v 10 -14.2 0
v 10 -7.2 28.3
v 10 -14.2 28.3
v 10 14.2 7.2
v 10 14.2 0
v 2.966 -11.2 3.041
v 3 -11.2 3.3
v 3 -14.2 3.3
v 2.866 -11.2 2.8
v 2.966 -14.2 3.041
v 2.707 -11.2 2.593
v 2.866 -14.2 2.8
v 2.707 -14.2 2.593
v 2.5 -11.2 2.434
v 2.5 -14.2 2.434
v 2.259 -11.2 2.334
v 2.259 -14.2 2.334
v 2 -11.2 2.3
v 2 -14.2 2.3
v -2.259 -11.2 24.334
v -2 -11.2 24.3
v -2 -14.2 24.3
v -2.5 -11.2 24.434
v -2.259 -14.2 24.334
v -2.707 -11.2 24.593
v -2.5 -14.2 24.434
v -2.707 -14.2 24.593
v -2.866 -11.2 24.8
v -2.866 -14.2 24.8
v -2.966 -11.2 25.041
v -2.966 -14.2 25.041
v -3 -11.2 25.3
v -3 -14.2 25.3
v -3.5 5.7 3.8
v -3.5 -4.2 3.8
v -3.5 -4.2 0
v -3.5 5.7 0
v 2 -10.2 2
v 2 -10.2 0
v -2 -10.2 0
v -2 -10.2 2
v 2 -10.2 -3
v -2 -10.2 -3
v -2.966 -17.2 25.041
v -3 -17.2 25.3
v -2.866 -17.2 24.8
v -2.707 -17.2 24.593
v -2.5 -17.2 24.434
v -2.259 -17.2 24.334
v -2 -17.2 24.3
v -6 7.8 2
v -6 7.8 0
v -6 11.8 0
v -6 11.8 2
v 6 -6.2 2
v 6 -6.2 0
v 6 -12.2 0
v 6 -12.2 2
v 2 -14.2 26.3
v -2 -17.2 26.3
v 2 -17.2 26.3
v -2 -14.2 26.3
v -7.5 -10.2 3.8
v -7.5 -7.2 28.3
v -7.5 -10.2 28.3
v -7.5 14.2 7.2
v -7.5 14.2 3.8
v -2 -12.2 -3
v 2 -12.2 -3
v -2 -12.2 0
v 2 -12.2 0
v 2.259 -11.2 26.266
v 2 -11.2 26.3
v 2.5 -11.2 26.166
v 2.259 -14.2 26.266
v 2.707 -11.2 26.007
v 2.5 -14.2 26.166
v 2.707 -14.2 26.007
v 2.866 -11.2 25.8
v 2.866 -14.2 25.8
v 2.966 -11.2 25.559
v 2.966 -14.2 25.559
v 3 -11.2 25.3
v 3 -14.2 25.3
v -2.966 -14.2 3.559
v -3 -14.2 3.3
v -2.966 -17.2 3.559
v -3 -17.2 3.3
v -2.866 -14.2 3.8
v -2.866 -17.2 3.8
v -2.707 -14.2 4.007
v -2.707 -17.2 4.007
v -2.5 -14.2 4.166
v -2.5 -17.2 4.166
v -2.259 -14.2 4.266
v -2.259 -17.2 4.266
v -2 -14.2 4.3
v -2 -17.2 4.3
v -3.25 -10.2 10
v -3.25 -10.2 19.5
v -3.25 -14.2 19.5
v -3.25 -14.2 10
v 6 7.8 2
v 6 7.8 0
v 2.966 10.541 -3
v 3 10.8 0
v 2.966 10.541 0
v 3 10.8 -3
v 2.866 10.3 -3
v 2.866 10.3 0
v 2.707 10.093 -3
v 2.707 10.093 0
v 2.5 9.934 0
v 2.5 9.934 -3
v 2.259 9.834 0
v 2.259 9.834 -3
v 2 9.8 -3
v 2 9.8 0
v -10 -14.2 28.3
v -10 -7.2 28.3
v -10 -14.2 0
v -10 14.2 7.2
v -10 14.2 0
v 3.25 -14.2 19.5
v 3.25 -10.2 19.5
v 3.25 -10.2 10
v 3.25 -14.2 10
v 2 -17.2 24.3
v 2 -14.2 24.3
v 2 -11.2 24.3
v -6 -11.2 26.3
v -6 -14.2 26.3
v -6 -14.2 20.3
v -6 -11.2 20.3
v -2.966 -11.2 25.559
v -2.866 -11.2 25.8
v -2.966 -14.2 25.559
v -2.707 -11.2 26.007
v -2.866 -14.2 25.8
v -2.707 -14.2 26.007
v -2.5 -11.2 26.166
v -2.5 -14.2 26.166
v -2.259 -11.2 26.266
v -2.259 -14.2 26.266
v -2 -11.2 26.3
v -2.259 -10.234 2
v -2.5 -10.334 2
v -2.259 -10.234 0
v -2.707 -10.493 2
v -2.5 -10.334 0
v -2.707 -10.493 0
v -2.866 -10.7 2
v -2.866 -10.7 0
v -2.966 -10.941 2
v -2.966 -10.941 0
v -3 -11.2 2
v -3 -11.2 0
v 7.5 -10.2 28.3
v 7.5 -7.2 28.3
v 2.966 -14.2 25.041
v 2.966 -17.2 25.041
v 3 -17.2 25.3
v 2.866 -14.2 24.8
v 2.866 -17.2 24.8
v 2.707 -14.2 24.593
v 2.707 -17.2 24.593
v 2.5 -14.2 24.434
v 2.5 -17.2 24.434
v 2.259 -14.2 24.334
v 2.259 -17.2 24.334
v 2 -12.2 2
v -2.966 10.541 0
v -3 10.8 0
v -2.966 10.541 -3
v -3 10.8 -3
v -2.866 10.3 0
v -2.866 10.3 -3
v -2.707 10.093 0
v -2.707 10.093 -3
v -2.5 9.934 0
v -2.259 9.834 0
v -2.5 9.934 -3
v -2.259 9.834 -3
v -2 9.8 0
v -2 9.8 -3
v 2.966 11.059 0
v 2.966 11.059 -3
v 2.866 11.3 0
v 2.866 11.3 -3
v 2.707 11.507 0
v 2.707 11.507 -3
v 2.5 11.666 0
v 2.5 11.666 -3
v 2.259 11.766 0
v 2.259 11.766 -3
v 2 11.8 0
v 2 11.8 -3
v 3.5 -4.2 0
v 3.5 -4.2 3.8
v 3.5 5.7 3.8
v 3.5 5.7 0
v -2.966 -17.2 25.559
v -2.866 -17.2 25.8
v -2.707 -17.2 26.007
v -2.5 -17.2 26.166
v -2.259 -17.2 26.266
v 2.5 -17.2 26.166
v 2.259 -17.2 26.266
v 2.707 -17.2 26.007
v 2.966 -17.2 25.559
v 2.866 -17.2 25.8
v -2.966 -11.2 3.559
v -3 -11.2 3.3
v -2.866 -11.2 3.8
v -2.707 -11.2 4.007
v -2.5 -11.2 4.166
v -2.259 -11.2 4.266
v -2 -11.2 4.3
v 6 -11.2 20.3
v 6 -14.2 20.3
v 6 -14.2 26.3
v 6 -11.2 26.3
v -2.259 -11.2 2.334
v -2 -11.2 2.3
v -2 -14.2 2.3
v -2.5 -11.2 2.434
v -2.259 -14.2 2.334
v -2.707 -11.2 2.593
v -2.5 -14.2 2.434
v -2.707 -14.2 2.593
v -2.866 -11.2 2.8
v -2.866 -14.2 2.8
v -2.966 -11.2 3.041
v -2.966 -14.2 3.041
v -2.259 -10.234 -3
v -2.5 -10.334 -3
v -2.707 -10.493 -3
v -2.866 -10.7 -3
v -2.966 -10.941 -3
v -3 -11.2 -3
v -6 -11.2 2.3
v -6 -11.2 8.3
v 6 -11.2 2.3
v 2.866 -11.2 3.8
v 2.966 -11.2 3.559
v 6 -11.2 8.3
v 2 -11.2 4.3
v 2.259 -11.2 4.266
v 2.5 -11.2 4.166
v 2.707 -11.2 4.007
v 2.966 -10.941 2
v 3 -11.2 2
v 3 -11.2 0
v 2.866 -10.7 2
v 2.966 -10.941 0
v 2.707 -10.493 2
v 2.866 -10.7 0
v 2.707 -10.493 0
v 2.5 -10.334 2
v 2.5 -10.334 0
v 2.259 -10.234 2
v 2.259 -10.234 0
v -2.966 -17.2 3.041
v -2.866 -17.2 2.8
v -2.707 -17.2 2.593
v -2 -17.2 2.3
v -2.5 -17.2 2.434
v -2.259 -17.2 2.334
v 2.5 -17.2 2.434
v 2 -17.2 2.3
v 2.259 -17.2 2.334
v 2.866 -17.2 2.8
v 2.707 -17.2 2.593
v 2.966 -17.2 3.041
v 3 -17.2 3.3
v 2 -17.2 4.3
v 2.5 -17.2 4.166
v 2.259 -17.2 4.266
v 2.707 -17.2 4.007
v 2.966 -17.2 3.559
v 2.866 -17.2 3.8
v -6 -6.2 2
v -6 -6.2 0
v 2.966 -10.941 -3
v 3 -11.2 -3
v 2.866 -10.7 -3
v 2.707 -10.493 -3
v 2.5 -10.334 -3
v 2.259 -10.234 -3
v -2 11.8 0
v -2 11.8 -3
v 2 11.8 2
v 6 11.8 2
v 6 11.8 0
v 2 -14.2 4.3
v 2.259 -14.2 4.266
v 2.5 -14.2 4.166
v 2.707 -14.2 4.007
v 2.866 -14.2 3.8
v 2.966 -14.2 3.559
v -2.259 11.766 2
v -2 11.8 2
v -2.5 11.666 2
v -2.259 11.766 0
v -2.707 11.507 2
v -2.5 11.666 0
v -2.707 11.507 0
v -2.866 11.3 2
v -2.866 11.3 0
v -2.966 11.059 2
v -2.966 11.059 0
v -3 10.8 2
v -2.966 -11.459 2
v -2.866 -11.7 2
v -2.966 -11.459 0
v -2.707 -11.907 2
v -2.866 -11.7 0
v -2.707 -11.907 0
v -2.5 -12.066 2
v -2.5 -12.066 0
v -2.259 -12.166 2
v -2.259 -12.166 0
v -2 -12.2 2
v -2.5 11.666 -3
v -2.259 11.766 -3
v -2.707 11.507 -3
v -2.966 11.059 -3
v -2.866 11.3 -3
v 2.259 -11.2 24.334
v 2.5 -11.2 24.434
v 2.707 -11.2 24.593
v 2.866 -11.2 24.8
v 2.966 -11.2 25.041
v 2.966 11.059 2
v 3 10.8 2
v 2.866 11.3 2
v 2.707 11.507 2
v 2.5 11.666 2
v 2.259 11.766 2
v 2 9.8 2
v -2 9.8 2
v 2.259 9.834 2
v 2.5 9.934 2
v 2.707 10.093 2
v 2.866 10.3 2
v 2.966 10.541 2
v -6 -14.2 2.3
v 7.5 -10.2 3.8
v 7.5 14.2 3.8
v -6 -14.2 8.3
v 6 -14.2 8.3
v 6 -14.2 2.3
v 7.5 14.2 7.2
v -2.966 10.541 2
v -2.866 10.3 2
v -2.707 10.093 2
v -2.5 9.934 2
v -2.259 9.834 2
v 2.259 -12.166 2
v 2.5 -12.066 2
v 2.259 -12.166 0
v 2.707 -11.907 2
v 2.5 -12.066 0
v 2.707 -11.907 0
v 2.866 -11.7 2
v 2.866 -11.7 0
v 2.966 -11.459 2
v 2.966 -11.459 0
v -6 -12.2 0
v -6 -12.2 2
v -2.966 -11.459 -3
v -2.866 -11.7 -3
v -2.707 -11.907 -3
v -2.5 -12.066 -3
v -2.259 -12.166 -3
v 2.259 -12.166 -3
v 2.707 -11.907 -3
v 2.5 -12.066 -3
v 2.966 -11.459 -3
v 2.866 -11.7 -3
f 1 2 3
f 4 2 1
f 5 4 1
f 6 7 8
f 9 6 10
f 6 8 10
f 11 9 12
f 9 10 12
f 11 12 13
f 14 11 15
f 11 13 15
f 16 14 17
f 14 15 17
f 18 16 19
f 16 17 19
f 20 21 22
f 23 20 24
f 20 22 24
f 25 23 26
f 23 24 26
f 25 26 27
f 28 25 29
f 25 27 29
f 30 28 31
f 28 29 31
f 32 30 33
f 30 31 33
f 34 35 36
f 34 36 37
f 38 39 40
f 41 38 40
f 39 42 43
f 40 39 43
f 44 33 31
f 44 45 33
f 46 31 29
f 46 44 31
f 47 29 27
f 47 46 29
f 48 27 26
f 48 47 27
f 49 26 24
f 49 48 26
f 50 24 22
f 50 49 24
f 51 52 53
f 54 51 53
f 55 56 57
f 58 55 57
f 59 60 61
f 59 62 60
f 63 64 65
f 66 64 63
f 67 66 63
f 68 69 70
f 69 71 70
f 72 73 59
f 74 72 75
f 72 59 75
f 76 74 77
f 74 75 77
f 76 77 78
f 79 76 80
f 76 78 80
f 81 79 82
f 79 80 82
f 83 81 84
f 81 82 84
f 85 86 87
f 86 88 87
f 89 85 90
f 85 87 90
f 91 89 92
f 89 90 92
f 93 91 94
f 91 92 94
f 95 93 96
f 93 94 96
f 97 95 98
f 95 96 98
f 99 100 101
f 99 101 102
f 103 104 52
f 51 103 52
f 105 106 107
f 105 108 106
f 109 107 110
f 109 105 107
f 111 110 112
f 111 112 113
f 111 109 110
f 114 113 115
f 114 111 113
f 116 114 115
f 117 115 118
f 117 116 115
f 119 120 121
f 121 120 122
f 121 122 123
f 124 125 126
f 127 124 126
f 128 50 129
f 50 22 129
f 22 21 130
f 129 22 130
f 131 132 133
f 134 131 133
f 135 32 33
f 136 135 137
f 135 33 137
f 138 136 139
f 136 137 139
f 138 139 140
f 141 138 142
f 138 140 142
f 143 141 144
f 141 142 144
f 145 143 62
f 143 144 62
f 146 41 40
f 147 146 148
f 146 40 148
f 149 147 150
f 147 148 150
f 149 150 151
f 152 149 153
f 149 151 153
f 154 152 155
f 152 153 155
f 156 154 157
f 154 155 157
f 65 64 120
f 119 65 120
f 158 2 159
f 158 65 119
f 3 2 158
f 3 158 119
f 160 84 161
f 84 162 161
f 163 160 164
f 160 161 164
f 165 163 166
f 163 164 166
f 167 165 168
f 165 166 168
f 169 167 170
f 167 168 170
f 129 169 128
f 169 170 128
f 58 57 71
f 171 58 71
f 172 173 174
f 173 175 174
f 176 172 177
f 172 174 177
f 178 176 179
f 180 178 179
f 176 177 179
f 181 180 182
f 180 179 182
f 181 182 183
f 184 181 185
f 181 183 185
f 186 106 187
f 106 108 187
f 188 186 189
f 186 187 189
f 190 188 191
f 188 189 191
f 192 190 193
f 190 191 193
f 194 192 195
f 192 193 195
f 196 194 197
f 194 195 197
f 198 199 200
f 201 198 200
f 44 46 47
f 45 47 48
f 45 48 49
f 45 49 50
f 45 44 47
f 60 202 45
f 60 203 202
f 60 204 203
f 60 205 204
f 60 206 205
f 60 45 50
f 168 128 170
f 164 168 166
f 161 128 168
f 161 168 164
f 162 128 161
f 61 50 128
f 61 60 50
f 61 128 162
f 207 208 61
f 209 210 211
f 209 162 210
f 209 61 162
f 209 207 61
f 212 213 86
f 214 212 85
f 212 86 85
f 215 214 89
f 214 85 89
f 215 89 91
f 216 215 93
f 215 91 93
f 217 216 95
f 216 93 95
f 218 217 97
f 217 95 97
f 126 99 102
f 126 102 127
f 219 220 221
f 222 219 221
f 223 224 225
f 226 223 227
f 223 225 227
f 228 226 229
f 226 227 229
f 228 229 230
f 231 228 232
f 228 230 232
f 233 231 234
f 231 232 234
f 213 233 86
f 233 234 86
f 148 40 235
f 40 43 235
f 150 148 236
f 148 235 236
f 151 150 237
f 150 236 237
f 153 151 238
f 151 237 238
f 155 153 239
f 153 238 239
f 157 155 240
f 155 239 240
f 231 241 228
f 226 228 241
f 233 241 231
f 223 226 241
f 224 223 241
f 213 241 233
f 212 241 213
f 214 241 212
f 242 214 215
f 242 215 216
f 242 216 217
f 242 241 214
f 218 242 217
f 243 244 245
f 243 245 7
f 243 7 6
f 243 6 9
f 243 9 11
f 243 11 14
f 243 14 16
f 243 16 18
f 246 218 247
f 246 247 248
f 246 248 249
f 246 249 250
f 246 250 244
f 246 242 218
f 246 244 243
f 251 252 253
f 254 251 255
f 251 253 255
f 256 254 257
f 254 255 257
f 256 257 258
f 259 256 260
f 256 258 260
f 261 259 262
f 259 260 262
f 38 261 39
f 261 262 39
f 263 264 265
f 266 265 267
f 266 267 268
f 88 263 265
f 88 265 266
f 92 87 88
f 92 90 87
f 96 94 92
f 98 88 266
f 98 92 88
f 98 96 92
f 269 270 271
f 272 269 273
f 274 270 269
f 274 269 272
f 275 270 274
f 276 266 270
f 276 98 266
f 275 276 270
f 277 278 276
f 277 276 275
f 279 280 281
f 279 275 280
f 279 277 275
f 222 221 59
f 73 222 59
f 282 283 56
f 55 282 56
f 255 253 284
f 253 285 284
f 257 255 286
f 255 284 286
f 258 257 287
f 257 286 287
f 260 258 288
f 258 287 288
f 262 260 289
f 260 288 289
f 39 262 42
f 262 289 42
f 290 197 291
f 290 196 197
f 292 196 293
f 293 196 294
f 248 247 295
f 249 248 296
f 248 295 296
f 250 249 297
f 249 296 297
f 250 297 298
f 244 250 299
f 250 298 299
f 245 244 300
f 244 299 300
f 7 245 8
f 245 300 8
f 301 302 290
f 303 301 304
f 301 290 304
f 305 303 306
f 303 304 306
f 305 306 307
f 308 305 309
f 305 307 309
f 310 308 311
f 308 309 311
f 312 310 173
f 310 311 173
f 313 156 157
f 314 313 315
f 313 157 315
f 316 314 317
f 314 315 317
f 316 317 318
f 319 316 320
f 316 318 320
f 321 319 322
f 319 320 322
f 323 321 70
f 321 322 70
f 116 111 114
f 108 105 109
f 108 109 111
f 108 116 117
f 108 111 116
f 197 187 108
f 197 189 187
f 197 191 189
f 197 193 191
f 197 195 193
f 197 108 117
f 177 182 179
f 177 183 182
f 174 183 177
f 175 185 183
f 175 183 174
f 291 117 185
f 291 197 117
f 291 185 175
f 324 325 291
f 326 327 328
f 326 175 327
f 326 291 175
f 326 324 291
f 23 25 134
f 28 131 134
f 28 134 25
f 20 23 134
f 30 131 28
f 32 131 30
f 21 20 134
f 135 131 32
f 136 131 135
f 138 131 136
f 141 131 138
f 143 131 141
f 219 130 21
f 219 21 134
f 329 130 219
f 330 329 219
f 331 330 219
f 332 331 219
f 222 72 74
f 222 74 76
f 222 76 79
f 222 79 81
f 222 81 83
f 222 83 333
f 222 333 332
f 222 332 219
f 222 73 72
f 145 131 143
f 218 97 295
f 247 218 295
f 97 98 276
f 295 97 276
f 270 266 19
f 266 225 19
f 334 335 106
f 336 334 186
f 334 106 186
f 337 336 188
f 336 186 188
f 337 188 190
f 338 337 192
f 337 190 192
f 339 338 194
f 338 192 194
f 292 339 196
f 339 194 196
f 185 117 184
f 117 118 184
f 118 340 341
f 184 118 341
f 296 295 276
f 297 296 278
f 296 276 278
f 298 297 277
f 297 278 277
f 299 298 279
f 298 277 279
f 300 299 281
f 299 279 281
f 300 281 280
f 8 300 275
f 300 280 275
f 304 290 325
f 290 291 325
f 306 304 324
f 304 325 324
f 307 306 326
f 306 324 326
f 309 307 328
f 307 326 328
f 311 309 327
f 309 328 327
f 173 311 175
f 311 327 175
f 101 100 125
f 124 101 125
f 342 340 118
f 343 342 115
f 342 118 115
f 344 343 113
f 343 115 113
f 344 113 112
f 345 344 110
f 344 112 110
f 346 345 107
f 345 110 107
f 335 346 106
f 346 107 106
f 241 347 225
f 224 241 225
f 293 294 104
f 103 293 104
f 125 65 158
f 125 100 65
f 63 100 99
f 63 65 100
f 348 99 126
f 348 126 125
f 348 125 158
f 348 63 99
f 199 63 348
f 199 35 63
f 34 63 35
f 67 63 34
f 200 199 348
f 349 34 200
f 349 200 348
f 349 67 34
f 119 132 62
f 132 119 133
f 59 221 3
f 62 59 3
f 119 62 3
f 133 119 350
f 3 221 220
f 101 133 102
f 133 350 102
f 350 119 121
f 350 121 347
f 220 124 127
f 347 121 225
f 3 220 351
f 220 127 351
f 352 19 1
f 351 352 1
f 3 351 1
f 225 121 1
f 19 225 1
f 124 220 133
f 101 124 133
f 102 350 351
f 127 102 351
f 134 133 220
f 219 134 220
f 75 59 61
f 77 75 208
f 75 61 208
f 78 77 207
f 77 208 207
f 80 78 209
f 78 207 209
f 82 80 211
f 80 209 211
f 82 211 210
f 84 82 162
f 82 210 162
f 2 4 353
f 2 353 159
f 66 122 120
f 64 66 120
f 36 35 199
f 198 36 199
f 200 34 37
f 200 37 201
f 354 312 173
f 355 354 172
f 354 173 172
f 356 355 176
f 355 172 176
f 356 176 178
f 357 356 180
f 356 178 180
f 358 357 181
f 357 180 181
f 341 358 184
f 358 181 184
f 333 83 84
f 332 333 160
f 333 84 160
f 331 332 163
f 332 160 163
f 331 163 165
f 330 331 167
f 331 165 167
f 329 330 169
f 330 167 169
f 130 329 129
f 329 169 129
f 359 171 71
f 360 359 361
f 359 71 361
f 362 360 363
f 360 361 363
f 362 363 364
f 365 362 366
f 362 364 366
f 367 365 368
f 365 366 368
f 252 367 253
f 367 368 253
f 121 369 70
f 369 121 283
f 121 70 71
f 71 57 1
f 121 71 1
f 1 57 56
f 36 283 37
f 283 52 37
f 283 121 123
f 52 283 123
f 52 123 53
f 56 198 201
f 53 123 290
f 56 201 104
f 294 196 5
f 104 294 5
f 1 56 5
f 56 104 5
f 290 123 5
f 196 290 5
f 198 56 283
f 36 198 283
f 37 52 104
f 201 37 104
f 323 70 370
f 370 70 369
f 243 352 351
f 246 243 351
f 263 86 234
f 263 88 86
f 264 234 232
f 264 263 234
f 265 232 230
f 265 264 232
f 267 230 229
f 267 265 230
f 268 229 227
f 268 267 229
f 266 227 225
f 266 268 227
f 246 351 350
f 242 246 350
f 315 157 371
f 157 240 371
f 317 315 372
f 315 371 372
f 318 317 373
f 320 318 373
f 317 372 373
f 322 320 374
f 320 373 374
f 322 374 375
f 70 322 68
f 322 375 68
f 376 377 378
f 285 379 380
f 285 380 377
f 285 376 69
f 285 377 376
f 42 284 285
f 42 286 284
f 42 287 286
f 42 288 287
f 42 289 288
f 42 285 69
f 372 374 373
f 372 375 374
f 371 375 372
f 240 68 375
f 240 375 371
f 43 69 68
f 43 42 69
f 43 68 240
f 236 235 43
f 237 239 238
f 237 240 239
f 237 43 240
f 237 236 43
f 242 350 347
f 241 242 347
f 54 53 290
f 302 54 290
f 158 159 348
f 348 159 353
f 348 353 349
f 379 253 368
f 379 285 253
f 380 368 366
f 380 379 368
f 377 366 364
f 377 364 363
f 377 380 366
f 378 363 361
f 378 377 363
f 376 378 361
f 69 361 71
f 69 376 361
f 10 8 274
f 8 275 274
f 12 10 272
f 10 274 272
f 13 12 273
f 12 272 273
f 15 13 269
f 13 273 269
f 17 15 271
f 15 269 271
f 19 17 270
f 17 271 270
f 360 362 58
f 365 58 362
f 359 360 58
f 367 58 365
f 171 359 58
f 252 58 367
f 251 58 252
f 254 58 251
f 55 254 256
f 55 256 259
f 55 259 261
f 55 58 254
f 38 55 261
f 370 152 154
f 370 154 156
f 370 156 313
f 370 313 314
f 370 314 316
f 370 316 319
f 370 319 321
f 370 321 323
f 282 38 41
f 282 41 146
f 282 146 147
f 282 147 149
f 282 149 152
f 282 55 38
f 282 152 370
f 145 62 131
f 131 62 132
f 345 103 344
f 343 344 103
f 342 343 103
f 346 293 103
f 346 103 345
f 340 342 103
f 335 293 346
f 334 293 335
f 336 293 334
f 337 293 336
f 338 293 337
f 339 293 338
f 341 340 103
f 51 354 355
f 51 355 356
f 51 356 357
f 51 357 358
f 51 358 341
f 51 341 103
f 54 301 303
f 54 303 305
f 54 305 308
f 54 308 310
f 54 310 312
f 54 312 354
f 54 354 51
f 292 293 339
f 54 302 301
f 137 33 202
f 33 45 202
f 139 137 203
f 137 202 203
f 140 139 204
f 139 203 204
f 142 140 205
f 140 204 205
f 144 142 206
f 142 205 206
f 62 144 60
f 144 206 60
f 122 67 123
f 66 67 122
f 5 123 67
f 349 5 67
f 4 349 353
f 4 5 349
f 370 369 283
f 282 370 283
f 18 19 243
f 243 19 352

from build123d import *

# Parameters (mm, degrees)
SKETCH1_W                      = 20
SKETCH1_H                      = 28.4
BACK_WALL_DEPTH                = 3.8
SKETCH3_W                      = 20
SKETCH3_H                      = 4
BOTTOM_WALL_DEPTH              = 24.5
LEFT_WALL_DEPTH                = 2.5
SKETCH6_W                      = 6.5
SKETCH6_H                      = 9.5
BOTTOM_CONNECTION_CUTOUT_DEPTH = 11
SKETCH7_W                      = 7
SKETCH7_H                      = 9.9
TOP_CONNECTION_CUTOUT_DEPTH    = 11
SKETCH8_W                      = 6
SKETCH8_H                      = 2
BOTTOM_NOTCH_DEPTH             = 3
SKETCH9_W                      = 6
SKETCH9_H                      = 2
TOP_NOTCH_DEPTH                = 3
FILLET1_R                      = 1
BOTTOM_LIGHTENING_CUTOUT_DEPTH = 3
CUT_EXTRUDE2_DEPTH             = 2


with BuildPart() as part:
    # Sketch1 → back_wall (new body)
    with BuildSketch(Plane.XY):
        Rectangle(SKETCH1_W, SKETCH1_H)
    extrude(amount=BACK_WALL_DEPTH)

    # Sketch3 → bottom_wall (add)
    with BuildSketch(Plane.XY.offset(3.8)):
        with Locations((0, -12.2)):
            Rectangle(SKETCH3_W, SKETCH3_H)
    extrude(amount=BOTTOM_WALL_DEPTH)

    # Sketch4 → left_wall (add)
    with BuildSketch(Plane.ZY.offset(10)):
        Polygon((3.8, 14.2), (7.2, 14.2), (28.3, -7.2), (28.3, -10.2), (3.8, -10.2), align=None)
    left_wall = extrude(amount=-LEFT_WALL_DEPTH)

    # right_wall: left_wall across plane
    add(left_wall.mirror(Plane(origin=(0, 0, 0), x_dir=(0, 0, 1), z_dir=(1, 0, 0))))

    # Sketch6 → bottom_connection_cutout (cut)
    with BuildSketch(Plane(origin=(0, -10.2, 0), x_dir=(1, 0, 0), z_dir=(0, 1, 0))):
        with Locations((0, -14.75)):
            Rectangle(SKETCH6_W, SKETCH6_H)
    extrude(amount=-BOTTOM_CONNECTION_CUTOUT_DEPTH, mode=Mode.SUBTRACT)

    # Sketch7 → top_connection_cutout (cut)
    with BuildSketch(Plane.XY.offset(3.8)):
        with Locations((0, 0.75)):
            Rectangle(SKETCH7_W, SKETCH7_H)
    extrude(amount=-TOP_CONNECTION_CUTOUT_DEPTH, mode=Mode.SUBTRACT)

    # Sketch8 → bottom_notch (add)
    with BuildSketch(Plane.XZ.offset(14.2)):
        with Locations((0, 25.3)):
            Rectangle(SKETCH8_W, SKETCH8_H)
        with Locations((0, 3.3)):
            Rectangle(SKETCH8_W, SKETCH8_H)
    extrude(amount=BOTTOM_NOTCH_DEPTH)

    # Sketch9 → top_notch (add)
    with BuildSketch(Plane(origin=(0, 0, 0), x_dir=(-1, 0, 0), z_dir=(0, 0, -1))):
        with Locations((0, -11.2)):
            Rectangle(SKETCH9_W, SKETCH9_H)
        with Locations((0, 10.8)):
            Rectangle(SKETCH9_W, SKETCH9_H)
    extrude(amount=TOP_NOTCH_DEPTH)

    # Fillet1
    fillet1_edges = [part.edges().sort_by_distance(p)[0] for p in [
        (3, 9.8, -1.5),
        (3, 11.8, -1.5),
        (-3, 11.8, -1.5),
        (-3, 9.8, -1.5),
        (-3, -12.2, -1.5),
        (-3, -10.2, -1.5),
        (3, -10.2, -1.5),
        (3, -12.2, -1.5),
        (3, -15.7, 4.3),
        (3, -15.7, 2.3),
        (-3, -15.7, 4.3),
        (-3, -15.7, 2.3),
        (-3, -15.7, 26.3),
        (-3, -15.7, 24.3),
        (3, -15.7, 26.3),
        (3, -15.7, 24.3),
    ]]
    fillet(fillet1_edges, radius=FILLET1_R - 0.0001)  # a hair under: the kernel refuses the full size

    # Sketch11 → bottom_lightening_cutout (cut)
    with BuildSketch(Plane.XZ.offset(14.2)):
        with BuildLine():
            Line((2, 2.3), (6, 2.3))
            Line((6, 2.3), (6, 8.3))
            Line((6, 8.3), (-6, 8.3))
            Line((-6, 8.3), (-6, 2.3))
            Line((-6, 2.3), (-2, 2.3))
            ThreePointArc((-2, 2.3), (-2.707106781, 2.592893219), (-3, 3.3))
            ThreePointArc((-3, 3.3), (-2.707106781, 4.007106781), (-2, 4.3))
            Line((-2, 4.3), (2, 4.3))
            ThreePointArc((2, 4.3), (2.707106781, 4.007106781), (3, 3.3))
            ThreePointArc((3, 3.3), (2.707106781, 2.592893219), (2, 2.3))
        make_face()
        with BuildLine():
            Line((-6, 20.3), (6, 20.3))
            Line((6, 20.3), (6, 26.3))
            Line((6, 26.3), (2, 26.3))
            ThreePointArc((2, 26.3), (2.707106781, 26.007106781), (3, 25.3))
            ThreePointArc((3, 25.3), (2.707106781, 24.592893219), (2, 24.3))
            Line((2, 24.3), (-2, 24.3))
            ThreePointArc((-2, 24.3), (-2.707106781, 24.592893219), (-3, 25.3))
            ThreePointArc((-3, 25.3), (-2.707106781, 26.007106781), (-2, 26.3))
            Line((-2, 26.3), (-6, 26.3))
            Line((-6, 26.3), (-6, 20.3))
        make_face()
    extrude(amount=-BOTTOM_LIGHTENING_CUTOUT_DEPTH, mode=Mode.SUBTRACT)

    # Sketch13 → Cut-Extrude2 (cut)
    with BuildSketch(Plane(origin=(0, 0, 0), x_dir=(-1, 0, 0), z_dir=(0, 0, -1))):
        with BuildLine():
            Line((-2, 11.8), (-6, 11.8))
            Line((-6, 11.8), (-6, 7.8))
            Line((-6, 7.8), (6, 7.8))
            Line((6, 7.8), (6, 11.8))
            Line((6, 11.8), (2, 11.8))
            ThreePointArc((2, 11.8), (2.707106781, 11.507106781), (3, 10.8))
            ThreePointArc((3, 10.8), (2.707106781, 10.092893219), (2, 9.8))
            Line((2, 9.8), (-2, 9.8))
            ThreePointArc((-2, 9.8), (-2.707106781, 10.092893219), (-3, 10.8))
            ThreePointArc((-3, 10.8), (-2.707106781, 11.507106781), (-2, 11.8))
        make_face()
        with BuildLine():
            Line((6, -6.2), (-6, -6.2))
            Line((-6, -6.2), (-6, -12.2))
            Line((-6, -12.2), (-2, -12.2))
            ThreePointArc((-2, -12.2), (-2.707106781, -11.907106781), (-3, -11.2))
            ThreePointArc((-3, -11.2), (-2.707106781, -10.492893219), (-2, -10.2))
            Line((-2, -10.2), (2, -10.2))
            ThreePointArc((2, -10.2), (2.707106781, -10.492893219), (3, -11.2))
            ThreePointArc((3, -11.2), (2.707106781, -11.907106781), (2, -12.2))
            Line((2, -12.2), (6, -12.2))
            Line((6, -12.2), (6, -6.2))
        make_face()
    extrude(amount=-CUT_EXTRUDE2_DEPTH, mode=Mode.SUBTRACT)


solid = part.part
